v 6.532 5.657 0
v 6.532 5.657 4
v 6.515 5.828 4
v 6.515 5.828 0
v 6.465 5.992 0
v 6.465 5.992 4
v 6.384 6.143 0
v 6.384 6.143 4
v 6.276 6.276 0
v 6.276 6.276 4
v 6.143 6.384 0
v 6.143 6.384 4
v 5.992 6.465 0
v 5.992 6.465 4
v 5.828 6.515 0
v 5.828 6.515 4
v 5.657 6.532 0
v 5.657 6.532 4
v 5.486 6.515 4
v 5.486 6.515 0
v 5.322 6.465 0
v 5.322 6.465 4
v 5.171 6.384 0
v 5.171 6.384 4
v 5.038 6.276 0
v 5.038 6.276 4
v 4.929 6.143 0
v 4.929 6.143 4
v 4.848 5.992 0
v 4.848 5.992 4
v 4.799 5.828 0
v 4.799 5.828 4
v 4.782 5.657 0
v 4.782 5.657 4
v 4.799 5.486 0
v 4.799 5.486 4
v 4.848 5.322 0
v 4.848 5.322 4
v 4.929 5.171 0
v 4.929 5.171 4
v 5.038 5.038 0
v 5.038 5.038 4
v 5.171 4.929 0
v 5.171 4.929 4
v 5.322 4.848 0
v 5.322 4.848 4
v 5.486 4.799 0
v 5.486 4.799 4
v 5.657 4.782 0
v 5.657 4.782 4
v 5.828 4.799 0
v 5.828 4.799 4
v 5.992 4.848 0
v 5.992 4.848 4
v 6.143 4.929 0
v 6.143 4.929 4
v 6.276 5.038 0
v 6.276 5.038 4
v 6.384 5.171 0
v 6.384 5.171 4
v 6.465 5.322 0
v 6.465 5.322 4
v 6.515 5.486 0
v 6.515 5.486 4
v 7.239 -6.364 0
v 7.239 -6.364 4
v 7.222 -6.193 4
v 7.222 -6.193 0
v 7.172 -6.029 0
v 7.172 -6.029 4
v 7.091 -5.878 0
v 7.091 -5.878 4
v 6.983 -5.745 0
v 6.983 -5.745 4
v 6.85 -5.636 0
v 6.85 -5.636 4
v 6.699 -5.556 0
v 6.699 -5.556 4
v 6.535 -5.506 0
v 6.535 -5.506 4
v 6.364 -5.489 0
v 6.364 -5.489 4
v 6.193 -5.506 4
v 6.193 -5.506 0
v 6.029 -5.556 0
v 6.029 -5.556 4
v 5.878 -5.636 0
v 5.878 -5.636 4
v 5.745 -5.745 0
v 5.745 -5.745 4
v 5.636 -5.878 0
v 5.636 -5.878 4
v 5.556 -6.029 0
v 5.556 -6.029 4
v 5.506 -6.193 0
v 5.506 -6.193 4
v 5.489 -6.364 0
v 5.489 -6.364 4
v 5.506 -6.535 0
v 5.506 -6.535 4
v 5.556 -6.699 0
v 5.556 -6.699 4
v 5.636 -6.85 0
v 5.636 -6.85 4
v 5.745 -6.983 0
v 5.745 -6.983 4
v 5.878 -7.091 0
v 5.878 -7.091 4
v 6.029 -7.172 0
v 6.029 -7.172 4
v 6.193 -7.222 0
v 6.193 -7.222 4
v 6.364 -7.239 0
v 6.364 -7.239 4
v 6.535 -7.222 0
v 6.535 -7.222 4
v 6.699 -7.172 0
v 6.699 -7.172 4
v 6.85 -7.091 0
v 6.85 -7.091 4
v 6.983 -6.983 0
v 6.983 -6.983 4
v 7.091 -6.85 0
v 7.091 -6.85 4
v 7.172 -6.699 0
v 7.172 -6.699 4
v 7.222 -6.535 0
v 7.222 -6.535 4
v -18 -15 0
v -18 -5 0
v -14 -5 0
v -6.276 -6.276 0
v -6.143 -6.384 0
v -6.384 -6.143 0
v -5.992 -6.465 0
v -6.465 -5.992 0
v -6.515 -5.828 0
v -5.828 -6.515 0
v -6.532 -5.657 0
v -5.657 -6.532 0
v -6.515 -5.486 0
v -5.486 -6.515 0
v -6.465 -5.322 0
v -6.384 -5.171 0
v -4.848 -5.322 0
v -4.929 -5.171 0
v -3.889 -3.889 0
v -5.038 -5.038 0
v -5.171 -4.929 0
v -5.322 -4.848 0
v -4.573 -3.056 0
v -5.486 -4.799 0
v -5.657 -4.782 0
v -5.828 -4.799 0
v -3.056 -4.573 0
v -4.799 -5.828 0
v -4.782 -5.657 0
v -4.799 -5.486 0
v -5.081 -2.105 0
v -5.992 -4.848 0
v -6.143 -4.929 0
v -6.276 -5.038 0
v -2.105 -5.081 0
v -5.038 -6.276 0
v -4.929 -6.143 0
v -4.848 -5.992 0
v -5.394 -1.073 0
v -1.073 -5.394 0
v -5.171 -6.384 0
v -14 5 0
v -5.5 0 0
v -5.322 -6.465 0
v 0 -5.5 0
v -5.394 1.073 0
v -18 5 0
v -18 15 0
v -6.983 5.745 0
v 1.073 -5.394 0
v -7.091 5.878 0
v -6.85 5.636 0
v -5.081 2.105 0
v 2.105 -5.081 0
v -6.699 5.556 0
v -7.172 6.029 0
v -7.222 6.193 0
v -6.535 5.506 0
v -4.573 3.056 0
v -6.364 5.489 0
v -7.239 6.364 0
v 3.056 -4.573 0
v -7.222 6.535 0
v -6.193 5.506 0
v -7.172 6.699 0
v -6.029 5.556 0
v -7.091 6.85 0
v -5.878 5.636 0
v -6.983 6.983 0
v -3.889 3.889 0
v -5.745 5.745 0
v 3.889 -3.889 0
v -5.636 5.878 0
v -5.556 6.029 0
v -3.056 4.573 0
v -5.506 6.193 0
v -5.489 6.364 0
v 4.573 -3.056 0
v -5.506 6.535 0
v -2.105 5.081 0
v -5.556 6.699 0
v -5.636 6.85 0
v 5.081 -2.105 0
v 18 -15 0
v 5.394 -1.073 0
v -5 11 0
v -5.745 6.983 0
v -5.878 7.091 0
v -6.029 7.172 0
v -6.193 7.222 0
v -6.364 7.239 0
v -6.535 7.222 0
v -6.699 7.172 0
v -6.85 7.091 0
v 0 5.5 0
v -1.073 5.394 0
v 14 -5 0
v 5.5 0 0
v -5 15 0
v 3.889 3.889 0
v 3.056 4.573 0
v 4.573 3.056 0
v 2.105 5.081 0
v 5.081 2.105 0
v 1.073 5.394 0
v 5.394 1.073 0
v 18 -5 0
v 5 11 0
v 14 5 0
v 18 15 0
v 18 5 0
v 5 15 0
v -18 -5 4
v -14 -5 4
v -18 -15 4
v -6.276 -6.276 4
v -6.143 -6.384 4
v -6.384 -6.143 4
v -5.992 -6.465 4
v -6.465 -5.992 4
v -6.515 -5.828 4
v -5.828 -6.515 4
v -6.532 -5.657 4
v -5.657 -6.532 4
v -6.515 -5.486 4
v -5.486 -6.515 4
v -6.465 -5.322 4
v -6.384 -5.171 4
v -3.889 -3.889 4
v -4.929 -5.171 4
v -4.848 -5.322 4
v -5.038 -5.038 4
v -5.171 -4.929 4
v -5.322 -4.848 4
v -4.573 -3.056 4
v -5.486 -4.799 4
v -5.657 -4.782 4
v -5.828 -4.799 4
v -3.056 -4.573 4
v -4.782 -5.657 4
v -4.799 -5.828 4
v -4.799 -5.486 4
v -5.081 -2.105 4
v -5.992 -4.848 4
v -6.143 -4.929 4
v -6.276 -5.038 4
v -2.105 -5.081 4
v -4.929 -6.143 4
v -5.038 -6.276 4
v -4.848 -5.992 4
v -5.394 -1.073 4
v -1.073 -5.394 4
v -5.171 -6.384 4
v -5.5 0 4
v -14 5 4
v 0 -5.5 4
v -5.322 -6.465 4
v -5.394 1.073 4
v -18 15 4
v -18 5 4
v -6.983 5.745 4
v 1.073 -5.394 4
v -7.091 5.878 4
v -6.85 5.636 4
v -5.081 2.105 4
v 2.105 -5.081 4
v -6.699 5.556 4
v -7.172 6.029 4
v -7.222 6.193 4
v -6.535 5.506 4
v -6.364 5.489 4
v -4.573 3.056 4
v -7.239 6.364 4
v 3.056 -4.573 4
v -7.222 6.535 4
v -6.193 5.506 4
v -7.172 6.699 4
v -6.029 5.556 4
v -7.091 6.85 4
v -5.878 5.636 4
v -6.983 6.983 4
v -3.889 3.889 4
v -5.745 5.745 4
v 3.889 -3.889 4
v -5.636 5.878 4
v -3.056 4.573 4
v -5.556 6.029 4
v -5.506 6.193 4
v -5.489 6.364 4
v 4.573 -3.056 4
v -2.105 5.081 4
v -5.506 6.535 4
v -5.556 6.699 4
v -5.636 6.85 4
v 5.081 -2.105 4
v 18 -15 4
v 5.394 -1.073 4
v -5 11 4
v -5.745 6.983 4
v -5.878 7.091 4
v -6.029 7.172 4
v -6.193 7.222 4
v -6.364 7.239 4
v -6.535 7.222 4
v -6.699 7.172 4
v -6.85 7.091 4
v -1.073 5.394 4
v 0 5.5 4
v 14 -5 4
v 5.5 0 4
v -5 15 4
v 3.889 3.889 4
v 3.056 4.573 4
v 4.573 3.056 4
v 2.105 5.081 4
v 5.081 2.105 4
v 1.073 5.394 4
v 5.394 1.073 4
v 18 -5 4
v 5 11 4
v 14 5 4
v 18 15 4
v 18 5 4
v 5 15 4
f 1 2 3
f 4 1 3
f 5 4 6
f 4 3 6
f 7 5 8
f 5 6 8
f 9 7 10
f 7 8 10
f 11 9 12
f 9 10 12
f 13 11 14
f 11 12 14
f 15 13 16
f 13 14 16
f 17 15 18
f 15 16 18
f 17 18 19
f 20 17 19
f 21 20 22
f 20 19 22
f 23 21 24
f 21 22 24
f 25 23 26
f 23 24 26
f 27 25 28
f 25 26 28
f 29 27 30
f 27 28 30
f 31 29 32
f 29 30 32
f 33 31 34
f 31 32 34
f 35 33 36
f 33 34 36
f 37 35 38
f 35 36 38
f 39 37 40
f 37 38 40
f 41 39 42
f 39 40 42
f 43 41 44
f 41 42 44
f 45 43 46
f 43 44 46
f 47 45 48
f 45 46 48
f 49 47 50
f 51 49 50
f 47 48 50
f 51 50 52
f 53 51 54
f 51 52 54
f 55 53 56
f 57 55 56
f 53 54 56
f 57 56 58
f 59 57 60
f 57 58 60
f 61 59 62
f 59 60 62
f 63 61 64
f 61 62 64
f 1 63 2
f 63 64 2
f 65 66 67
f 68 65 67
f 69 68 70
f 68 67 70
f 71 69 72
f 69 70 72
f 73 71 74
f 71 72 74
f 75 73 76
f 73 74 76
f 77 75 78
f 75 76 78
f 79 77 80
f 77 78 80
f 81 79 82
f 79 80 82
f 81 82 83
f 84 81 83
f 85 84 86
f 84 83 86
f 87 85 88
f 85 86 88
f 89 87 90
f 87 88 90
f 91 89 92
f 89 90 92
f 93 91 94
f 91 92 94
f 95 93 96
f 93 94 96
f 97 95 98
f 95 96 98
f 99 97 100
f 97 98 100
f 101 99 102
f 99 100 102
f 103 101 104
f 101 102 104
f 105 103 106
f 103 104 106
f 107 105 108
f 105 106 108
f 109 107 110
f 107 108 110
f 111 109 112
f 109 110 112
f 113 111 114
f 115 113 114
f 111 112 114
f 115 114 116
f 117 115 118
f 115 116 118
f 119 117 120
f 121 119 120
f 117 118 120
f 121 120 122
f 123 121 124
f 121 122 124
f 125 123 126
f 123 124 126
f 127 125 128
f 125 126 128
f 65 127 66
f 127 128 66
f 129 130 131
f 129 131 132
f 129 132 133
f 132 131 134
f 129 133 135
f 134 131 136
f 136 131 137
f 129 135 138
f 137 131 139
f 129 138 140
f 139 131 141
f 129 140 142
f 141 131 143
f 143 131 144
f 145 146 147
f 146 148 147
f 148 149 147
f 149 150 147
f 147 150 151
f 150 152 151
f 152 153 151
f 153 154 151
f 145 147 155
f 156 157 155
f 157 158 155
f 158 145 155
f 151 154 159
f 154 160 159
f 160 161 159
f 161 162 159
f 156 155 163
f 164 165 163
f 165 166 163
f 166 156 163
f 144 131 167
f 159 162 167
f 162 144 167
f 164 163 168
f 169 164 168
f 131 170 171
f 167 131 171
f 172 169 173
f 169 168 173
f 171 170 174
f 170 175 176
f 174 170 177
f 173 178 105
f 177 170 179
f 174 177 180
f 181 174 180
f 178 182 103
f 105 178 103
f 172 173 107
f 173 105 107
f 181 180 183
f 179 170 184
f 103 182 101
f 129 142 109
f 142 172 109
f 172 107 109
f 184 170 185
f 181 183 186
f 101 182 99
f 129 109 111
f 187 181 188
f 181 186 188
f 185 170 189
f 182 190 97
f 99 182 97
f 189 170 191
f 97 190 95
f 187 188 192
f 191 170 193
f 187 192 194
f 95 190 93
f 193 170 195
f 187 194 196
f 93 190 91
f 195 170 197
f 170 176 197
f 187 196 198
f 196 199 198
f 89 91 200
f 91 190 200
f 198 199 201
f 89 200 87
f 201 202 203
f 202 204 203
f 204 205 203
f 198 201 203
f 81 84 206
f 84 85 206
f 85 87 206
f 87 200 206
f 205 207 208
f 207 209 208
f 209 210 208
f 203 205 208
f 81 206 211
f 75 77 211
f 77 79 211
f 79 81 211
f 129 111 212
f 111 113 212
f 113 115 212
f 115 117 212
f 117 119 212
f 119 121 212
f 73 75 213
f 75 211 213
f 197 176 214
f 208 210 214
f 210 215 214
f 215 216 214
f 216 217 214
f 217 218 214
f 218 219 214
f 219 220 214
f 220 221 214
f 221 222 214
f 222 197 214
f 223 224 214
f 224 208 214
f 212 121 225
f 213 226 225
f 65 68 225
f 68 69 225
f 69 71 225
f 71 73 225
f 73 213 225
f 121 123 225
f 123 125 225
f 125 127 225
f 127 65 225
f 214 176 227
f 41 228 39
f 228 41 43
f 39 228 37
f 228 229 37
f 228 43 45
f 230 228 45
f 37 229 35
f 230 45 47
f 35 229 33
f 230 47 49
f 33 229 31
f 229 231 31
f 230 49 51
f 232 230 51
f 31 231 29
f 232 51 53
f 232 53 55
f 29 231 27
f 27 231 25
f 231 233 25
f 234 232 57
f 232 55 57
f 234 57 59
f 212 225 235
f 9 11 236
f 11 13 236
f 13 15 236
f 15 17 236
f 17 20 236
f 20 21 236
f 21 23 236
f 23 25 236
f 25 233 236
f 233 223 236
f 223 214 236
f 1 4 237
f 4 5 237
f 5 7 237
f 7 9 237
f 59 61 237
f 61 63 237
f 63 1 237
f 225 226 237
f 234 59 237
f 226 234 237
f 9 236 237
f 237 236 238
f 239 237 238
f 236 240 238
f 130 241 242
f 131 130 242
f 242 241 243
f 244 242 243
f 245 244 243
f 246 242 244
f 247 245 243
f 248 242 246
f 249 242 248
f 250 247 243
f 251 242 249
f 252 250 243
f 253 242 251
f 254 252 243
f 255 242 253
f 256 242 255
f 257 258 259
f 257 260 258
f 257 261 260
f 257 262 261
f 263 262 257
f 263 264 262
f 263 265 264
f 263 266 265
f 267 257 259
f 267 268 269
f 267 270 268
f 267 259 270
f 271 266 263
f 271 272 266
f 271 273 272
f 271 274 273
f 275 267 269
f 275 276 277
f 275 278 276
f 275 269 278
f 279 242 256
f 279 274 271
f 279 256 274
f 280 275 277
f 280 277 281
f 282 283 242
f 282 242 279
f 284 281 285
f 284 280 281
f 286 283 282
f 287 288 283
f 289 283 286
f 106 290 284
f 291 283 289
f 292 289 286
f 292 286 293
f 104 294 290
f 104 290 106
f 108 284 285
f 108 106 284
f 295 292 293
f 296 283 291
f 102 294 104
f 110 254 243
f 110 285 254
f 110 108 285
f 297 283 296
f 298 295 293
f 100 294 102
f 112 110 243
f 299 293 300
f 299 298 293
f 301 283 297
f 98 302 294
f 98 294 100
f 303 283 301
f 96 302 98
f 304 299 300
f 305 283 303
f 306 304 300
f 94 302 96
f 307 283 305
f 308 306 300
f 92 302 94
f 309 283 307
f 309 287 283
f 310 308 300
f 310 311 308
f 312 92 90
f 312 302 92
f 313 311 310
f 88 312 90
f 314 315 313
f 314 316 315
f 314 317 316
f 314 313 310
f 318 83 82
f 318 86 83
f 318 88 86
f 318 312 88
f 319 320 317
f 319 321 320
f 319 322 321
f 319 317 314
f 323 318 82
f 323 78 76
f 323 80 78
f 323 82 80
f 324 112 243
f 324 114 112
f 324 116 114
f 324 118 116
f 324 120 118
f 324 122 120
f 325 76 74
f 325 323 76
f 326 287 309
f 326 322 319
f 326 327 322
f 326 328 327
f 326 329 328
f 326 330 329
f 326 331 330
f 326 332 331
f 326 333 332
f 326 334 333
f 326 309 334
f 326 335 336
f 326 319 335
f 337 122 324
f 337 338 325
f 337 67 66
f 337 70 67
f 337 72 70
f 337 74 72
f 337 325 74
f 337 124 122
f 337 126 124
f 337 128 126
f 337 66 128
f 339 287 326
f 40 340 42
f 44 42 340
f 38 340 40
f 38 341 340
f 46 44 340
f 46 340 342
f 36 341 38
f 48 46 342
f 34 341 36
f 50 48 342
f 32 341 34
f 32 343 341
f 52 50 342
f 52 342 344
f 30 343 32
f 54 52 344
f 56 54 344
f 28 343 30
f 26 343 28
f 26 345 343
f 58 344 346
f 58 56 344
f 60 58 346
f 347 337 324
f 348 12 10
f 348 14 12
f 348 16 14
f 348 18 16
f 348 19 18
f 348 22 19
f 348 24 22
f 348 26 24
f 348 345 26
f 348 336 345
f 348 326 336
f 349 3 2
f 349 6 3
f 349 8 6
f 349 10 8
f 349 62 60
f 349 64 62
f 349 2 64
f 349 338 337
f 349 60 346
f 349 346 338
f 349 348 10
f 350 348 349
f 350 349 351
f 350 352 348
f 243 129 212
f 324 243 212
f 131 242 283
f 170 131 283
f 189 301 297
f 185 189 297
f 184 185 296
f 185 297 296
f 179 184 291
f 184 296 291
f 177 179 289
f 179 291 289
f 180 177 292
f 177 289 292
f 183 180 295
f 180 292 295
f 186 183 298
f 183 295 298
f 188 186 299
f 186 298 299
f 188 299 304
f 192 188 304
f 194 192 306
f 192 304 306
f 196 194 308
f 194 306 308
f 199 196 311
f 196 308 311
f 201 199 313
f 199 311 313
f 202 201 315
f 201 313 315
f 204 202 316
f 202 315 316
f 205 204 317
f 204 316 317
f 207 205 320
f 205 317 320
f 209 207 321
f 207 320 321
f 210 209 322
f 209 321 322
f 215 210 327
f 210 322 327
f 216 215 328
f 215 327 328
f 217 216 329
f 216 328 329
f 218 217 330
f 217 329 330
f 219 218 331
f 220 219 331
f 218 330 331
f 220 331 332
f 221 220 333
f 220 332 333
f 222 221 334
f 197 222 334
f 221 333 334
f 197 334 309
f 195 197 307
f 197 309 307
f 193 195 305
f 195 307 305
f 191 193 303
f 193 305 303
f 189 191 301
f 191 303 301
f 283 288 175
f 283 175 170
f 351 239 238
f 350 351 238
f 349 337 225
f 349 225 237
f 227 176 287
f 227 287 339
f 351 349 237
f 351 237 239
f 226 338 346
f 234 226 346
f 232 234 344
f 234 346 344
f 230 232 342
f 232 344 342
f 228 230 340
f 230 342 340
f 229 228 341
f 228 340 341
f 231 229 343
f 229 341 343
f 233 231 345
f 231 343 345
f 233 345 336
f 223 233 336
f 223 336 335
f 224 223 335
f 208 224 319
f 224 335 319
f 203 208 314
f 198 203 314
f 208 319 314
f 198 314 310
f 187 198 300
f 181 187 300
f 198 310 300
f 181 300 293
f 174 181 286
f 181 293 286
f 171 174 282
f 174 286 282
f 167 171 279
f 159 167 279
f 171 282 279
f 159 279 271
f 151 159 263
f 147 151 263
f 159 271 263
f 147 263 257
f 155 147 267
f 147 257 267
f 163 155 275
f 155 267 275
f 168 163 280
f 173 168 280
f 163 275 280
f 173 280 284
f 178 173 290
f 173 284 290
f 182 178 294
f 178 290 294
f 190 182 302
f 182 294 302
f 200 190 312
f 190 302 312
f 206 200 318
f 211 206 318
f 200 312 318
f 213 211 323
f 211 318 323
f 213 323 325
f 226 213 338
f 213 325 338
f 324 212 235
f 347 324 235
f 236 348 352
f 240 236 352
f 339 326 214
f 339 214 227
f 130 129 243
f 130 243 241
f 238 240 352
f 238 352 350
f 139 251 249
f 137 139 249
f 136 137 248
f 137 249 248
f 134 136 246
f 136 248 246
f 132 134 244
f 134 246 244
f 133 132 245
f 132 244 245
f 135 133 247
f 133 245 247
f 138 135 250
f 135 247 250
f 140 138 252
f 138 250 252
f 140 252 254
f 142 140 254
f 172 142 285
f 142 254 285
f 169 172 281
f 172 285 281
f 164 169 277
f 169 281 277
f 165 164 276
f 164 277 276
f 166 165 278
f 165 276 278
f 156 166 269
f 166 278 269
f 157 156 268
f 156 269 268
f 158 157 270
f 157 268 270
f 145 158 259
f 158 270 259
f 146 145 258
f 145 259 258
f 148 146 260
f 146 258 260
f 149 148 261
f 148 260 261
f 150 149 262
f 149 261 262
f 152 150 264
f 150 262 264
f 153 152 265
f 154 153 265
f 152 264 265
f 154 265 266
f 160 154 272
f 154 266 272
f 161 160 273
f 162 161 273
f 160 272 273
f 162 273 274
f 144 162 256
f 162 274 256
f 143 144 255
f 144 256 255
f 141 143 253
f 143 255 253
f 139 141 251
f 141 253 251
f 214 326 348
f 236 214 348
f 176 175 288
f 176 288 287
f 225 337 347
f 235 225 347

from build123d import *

# Parameters (mm, degrees)
SKIZZE1_W                       = 36
SKIZZE1_H                       = 30
AUFSATZ_LINEAR_AUSTRAGEN1_DEPTH = 4
SKIZZE2_R                       = 5.5
SKIZZE2_R_2                     = 0.875
SCHNITT_LINEAR_AUSTRAGEN1_DEPTH = 4
SKIZZE3_W                       = 4
SKIZZE3_H                       = 10
SKIZZE3_W_2                     = 10
SKIZZE3_H_2                     = 4
SCHNITT_LINEAR_AUSTRAGEN2_DEPTH = 24.769728648


with BuildPart() as part:
    # Skizze1 → Aufsatz-Linear austragen1 (new body)
    with BuildSketch(Plane.XY):
        Rectangle(SKIZZE1_W, SKIZZE1_H)
    extrude(amount=AUFSATZ_LINEAR_AUSTRAGEN1_DEPTH)

    # Skizze2 → Schnitt-Linear austragen1 (cut)
    with BuildSketch(Plane.XY.offset(4)):
        Circle(SKIZZE2_R)
        with Locations((5.656854249, 5.656854249)):
            Circle(SKIZZE2_R_2)
        with Locations((6.363961031, -6.363961031)):
            Circle(SKIZZE2_R_2)
        with Locations(Location((-5.656854249, -5.656854249, 0), (0, 0, 180))):
            Circle(SKIZZE2_R_2)
        with Locations(Location((-6.363961031, 6.363961031, 0), (0, 0, 180))):
            Circle(SKIZZE2_R_2)
    extrude(amount=-SCHNITT_LINEAR_AUSTRAGEN1_DEPTH, mode=Mode.SUBTRACT)

    # Skizze3 → Schnitt-Linear austragen2 (cut, through all)
    with BuildSketch(Plane.XY.offset(4)):
        with Locations((-16, 0)):
            Rectangle(SKIZZE3_W, SKIZZE3_H)
        with Locations((0, 13)):
            Rectangle(SKIZZE3_W_2, SKIZZE3_H_2)
        with Locations((16, 0)):
            Rectangle(SKIZZE3_W, SKIZZE3_H)
    extrude(amount=-SCHNITT_LINEAR_AUSTRAGEN2_DEPTH, mode=Mode.SUBTRACT)


solid = part.part
